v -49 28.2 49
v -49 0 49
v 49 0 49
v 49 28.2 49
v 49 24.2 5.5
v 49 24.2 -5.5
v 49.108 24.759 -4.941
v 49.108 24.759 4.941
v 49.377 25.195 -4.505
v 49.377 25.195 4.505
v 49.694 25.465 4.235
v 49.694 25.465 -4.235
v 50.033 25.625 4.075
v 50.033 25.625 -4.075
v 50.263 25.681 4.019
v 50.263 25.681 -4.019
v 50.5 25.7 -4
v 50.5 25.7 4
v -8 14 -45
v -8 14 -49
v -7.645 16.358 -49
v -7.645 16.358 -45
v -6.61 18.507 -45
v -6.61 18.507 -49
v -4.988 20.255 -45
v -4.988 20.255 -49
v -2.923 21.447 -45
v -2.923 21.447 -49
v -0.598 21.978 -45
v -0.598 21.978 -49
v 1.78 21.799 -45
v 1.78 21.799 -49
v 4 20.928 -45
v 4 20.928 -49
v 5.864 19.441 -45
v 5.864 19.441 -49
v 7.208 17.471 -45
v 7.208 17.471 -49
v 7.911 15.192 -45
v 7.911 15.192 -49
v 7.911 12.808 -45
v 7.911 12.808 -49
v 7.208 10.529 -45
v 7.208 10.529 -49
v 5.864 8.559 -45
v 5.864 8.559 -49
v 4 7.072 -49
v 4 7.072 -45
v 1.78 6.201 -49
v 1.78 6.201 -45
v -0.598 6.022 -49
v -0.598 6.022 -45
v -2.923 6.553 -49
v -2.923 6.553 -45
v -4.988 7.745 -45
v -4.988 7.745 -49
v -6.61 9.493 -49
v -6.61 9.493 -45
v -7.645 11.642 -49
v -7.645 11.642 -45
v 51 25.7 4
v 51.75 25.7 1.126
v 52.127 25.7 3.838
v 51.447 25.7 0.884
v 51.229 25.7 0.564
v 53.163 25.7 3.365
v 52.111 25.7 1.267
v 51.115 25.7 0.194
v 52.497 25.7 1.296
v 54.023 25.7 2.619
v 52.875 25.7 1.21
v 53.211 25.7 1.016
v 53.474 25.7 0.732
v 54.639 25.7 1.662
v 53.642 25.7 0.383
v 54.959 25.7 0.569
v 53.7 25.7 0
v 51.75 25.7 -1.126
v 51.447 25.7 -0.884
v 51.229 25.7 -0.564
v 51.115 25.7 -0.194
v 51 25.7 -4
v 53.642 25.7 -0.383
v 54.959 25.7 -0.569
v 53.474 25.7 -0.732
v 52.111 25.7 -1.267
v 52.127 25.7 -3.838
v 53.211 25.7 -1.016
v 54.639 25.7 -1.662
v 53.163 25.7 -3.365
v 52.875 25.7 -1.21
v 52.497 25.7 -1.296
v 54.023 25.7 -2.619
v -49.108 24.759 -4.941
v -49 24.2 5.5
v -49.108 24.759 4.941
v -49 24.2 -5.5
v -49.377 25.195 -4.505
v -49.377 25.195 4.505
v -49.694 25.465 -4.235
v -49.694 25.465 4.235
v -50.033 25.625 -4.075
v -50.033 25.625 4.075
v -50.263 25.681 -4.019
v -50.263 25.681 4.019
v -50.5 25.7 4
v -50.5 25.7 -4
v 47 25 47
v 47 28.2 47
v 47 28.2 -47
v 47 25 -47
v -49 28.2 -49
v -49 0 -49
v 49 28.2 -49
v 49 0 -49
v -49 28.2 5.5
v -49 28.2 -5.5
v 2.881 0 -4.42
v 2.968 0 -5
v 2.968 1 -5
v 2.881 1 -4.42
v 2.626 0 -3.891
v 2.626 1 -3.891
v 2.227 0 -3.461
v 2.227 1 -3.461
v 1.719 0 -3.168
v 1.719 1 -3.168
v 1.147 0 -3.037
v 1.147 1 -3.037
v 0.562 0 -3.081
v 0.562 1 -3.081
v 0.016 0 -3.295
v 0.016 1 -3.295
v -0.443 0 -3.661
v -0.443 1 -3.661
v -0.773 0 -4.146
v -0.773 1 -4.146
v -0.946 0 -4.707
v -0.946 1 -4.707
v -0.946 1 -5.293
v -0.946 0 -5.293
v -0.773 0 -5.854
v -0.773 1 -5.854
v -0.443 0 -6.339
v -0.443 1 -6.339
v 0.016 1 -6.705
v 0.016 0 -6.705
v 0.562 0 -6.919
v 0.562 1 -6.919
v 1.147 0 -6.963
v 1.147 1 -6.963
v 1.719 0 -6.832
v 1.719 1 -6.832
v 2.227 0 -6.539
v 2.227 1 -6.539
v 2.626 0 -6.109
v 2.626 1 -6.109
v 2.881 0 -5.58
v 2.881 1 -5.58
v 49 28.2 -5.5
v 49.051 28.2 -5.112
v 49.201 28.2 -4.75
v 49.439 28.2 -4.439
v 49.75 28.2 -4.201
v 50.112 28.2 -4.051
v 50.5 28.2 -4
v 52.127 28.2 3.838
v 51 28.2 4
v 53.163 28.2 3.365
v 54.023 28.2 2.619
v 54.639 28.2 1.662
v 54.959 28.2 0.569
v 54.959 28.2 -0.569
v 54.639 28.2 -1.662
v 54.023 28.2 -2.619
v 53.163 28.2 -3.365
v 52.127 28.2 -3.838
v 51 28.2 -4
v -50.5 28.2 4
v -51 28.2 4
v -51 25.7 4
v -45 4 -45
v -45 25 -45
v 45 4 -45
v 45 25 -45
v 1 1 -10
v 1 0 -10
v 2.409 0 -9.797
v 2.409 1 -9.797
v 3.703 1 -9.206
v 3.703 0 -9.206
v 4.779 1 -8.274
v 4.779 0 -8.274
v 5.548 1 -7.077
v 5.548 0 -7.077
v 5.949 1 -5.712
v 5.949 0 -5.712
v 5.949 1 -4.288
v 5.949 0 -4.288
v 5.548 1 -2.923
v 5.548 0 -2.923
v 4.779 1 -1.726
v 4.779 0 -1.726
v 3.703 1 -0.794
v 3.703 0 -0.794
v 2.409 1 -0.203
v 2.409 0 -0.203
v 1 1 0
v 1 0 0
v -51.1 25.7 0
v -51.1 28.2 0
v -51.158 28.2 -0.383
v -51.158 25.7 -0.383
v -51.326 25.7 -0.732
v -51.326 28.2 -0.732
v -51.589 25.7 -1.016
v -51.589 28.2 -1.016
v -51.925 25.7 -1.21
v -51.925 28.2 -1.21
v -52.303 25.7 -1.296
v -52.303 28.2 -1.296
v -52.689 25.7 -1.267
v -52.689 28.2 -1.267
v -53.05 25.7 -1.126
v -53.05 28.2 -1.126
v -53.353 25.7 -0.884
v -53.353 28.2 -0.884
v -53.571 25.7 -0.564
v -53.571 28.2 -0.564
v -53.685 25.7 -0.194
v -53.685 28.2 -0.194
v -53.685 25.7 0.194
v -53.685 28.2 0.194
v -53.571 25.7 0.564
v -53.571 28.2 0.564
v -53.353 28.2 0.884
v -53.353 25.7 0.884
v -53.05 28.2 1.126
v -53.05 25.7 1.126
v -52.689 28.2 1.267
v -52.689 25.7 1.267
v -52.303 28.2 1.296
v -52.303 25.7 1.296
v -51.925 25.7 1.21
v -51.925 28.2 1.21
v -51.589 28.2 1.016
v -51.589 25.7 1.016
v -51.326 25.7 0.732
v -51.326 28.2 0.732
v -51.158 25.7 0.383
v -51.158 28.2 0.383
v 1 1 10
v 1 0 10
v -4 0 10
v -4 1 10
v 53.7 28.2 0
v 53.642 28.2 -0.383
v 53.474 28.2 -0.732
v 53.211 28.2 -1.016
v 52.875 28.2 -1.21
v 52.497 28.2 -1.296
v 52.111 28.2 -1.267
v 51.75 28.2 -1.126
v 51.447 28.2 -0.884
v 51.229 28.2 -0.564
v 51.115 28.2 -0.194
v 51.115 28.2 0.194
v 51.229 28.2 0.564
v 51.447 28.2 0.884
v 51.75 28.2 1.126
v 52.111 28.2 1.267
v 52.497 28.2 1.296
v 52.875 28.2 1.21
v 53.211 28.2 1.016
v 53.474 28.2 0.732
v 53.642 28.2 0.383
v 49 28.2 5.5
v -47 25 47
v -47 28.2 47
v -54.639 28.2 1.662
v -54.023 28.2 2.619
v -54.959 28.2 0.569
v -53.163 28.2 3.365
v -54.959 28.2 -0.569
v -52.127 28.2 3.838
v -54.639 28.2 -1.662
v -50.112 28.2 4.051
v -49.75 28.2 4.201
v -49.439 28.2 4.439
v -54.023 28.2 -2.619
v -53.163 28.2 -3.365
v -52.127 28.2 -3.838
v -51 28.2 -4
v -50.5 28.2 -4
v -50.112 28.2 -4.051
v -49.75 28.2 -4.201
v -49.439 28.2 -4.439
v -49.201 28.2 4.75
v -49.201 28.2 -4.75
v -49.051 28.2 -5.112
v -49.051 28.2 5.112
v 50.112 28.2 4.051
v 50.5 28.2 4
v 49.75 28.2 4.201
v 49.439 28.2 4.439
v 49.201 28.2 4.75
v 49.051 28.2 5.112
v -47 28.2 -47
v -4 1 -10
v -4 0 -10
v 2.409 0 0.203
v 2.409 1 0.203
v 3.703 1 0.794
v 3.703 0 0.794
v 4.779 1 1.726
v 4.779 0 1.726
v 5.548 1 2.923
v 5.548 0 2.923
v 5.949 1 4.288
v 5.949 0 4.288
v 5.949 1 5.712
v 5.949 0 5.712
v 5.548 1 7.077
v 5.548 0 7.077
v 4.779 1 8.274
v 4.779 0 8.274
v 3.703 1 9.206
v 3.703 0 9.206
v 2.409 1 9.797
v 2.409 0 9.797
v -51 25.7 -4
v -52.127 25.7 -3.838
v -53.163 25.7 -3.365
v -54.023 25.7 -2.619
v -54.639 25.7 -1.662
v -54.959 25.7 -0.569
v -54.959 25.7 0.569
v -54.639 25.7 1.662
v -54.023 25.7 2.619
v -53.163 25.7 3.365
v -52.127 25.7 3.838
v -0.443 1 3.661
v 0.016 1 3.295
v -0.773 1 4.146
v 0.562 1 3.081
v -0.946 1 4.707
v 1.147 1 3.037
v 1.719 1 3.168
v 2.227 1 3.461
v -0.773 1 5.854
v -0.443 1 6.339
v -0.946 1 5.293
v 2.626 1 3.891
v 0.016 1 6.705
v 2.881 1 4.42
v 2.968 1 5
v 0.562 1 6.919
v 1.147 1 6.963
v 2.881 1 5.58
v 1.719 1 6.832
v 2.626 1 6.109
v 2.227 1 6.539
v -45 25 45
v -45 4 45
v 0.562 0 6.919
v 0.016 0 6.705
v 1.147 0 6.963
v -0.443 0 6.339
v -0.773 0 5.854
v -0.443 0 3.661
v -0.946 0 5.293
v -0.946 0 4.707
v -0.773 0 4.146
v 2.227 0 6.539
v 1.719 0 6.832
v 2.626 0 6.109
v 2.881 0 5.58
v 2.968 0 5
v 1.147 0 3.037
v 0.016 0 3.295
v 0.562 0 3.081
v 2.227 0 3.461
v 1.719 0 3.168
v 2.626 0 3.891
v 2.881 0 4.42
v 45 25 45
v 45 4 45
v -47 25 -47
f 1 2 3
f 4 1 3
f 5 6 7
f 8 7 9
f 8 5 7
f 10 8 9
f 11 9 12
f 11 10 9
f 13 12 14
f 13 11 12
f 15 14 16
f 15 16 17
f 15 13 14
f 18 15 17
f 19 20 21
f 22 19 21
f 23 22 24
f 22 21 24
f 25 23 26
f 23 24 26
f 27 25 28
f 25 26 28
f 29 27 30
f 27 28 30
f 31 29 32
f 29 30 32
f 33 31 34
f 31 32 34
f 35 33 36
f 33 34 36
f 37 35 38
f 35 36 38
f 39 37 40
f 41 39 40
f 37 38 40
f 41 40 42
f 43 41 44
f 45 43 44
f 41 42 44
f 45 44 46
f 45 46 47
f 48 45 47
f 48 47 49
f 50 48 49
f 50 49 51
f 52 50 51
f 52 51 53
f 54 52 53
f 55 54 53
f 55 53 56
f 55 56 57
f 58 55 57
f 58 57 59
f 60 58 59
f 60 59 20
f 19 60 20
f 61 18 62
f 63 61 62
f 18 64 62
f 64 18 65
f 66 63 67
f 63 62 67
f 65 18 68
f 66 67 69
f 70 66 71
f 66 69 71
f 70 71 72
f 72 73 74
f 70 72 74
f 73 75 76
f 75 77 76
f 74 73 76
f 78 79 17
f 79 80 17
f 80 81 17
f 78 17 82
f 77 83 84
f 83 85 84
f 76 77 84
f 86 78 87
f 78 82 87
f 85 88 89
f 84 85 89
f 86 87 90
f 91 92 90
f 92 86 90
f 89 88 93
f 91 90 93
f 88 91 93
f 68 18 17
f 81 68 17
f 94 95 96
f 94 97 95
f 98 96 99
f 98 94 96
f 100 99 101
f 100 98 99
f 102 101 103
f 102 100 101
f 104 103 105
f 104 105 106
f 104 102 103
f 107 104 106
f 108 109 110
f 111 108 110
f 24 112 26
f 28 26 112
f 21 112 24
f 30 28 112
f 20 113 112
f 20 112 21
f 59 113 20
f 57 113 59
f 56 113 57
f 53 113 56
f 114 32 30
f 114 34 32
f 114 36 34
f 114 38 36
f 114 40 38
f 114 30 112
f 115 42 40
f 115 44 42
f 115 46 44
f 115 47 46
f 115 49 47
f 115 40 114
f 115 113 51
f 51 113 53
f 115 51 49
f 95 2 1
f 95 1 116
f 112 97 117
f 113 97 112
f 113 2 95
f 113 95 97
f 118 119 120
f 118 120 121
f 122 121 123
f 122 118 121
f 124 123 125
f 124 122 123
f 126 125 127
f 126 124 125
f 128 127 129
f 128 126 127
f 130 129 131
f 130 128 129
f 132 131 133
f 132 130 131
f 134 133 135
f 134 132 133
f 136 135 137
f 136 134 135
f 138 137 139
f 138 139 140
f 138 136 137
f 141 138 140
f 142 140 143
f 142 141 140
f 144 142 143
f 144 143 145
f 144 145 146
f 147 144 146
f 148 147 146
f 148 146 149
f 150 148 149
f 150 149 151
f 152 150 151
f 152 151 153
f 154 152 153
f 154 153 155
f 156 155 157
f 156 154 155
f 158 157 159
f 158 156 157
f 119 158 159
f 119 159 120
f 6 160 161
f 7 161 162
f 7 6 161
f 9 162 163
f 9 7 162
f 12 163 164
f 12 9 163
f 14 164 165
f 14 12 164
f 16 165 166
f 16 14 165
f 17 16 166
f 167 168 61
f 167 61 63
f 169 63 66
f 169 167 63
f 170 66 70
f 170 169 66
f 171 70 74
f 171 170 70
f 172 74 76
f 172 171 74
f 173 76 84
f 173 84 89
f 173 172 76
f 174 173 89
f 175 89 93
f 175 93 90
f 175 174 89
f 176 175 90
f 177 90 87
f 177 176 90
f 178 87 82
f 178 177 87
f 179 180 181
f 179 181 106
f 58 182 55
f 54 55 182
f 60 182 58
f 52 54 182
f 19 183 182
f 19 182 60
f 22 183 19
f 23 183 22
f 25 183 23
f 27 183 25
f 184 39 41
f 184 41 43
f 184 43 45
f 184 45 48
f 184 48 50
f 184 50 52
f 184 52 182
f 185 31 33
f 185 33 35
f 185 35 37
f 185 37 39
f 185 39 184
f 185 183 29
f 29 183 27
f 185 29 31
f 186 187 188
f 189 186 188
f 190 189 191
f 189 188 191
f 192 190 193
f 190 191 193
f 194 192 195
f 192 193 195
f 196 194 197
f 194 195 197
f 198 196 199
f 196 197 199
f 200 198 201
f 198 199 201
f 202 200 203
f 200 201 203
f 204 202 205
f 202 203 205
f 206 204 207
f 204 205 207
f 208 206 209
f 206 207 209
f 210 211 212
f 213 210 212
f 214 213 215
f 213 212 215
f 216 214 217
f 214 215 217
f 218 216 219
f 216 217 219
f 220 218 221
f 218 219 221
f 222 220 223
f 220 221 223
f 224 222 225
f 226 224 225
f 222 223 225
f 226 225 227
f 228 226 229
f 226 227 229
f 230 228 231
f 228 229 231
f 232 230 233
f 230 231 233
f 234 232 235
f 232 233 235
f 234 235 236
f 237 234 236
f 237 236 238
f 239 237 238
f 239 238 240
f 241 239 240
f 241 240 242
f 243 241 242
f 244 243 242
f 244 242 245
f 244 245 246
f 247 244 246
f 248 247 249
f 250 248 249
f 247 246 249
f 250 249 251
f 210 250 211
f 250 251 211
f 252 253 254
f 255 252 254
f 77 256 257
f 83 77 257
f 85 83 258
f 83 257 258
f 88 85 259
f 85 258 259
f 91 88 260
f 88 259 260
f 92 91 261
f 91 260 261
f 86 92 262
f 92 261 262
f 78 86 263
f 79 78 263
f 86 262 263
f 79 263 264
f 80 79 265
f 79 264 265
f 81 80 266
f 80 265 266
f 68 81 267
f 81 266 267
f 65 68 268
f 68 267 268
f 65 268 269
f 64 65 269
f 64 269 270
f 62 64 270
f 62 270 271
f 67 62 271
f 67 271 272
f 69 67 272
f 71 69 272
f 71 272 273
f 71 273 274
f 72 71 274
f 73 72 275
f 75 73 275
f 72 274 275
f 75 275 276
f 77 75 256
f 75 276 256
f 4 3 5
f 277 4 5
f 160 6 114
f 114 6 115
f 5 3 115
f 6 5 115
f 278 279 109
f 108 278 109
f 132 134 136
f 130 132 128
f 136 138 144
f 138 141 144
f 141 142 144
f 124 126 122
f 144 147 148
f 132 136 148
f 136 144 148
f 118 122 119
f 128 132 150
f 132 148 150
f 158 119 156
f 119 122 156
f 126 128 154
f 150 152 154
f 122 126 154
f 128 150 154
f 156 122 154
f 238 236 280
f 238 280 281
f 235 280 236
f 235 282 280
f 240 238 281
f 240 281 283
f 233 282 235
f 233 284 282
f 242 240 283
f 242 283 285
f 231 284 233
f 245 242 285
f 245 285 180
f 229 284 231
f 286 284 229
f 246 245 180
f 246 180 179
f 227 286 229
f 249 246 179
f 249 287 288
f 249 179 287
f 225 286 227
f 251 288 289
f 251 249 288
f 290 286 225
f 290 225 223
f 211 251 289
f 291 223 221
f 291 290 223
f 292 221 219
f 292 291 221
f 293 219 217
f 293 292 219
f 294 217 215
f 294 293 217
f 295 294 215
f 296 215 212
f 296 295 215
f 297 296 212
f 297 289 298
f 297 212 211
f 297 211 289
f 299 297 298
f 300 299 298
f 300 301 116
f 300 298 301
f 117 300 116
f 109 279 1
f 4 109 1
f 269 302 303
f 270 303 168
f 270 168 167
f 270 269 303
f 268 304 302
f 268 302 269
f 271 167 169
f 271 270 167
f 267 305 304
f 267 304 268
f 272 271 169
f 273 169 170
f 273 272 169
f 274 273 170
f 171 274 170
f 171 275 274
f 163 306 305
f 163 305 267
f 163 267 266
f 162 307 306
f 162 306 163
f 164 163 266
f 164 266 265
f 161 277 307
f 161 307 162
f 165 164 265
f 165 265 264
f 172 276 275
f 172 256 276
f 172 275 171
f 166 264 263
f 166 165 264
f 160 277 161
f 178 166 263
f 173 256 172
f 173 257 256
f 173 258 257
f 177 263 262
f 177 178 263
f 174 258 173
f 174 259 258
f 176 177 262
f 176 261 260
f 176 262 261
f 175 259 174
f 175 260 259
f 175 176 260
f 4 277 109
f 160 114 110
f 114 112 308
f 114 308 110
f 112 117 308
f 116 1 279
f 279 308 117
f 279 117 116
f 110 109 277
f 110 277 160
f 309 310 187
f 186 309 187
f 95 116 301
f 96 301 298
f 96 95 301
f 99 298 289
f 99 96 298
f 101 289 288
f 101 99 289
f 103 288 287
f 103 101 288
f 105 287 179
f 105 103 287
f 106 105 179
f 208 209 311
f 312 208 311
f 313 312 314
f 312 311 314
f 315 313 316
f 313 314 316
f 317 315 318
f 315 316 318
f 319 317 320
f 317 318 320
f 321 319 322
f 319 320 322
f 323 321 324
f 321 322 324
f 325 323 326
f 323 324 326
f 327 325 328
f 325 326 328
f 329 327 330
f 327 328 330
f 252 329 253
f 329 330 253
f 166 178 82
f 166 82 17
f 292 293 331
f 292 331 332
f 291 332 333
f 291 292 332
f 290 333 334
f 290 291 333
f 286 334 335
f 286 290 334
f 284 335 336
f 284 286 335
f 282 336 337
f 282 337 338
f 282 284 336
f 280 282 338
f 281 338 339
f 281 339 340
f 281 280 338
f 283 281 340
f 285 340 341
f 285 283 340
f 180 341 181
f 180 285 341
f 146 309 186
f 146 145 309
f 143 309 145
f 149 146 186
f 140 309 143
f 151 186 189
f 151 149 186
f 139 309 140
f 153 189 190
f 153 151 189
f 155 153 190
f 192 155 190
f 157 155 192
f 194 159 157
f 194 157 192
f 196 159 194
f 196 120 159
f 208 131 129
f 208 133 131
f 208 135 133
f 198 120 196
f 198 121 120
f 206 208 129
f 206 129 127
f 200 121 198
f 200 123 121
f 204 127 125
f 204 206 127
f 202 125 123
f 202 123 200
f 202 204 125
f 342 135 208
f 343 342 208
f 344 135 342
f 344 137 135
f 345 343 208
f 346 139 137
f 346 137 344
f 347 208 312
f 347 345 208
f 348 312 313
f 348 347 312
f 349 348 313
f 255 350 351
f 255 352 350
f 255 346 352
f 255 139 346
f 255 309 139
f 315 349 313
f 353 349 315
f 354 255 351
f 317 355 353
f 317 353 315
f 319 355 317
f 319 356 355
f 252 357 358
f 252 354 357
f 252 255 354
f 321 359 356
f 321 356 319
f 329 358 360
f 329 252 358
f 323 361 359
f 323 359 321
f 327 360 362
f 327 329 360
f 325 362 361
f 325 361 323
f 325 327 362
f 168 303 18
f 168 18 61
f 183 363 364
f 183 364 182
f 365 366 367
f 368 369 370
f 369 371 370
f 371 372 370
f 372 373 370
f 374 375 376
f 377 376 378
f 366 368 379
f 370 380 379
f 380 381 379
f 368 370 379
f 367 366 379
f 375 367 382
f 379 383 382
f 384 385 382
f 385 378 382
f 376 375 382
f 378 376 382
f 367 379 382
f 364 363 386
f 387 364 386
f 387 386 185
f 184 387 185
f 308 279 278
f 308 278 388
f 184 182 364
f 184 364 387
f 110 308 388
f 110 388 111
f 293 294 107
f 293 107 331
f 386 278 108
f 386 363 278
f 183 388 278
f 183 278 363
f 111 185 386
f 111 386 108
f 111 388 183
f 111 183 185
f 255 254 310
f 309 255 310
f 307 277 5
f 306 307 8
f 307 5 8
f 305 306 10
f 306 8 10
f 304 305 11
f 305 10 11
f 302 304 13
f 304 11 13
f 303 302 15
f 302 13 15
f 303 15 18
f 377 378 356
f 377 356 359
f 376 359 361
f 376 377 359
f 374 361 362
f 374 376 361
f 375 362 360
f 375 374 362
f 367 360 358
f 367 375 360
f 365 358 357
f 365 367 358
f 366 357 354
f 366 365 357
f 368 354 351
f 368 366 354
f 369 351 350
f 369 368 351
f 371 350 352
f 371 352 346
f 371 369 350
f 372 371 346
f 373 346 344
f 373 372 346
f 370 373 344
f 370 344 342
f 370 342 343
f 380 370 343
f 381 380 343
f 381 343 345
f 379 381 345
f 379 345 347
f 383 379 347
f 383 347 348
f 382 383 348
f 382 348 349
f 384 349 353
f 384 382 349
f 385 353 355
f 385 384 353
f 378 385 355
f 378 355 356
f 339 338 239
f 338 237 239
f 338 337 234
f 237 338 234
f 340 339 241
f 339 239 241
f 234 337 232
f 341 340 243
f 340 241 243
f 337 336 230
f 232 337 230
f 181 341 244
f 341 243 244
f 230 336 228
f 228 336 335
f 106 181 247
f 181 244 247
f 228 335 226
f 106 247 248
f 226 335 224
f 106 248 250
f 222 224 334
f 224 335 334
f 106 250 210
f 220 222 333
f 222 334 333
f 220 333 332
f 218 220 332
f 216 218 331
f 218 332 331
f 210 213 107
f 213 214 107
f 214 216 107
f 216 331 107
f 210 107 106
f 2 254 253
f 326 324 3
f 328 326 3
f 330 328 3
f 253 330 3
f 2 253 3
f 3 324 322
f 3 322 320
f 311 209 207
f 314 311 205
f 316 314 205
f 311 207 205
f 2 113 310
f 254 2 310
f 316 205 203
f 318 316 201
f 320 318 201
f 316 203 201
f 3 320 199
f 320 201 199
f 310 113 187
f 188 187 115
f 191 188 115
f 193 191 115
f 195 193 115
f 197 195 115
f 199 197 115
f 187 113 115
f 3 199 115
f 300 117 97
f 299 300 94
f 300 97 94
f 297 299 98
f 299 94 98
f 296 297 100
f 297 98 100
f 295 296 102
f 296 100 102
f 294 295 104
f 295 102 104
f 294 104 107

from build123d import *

# Parameters (mm, degrees)
SKETCH1_W           = 98
SKETCH1_H           = 98
BOSS_EXTRUDE1_DEPTH = 30
SKETCH2_W           = 94
SKETCH2_H           = 94
CUT_EXTRUDE1_DEPTH  = 5
SKETCH3_W           = 90
SKETCH3_H           = 90
CUT_EXTRUDE2_DEPTH  = 21
SKETCH4_W           = 98
SKETCH4_H           = 98
SKETCH4_W_2         = 94
SKETCH4_H_2         = 94
CUT_EXTRUDE3_DEPTH  = 1.8
SKETCH5_R           = 1.3
BOSS_EXTRUDE2_DEPTH = 2.5
FILLET1_R           = 1.5
FILLET2_R           = 1.5
CUT_EXTRUDE4_REACH  = 100
SKETCH6_R           = 8
SKETCH7_R           = 1.968352886
CUT_EXTRUDE5_DEPTH  = 1


with BuildPart() as part:
    # Sketch1 → Boss-Extrude1 (new body)
    with BuildSketch(Plane(origin=(0, 0, 0), x_dir=(1, 0, 0), z_dir=(0, 1, 0))):
        Rectangle(SKETCH1_W, SKETCH1_H)
    extrude(amount=BOSS_EXTRUDE1_DEPTH)

    # Sketch2 → Cut-Extrude1 (cut)
    with BuildSketch(Plane(origin=(0, 30, 0), x_dir=(1, 0, 0), z_dir=(0, 1, 0))):
        Rectangle(SKETCH2_W, SKETCH2_H)
    extrude(amount=-CUT_EXTRUDE1_DEPTH, mode=Mode.SUBTRACT)

    # Sketch3 → Cut-Extrude2 (cut)
    with BuildSketch(Plane(origin=(0, 25, 0), x_dir=(1, 0, 0), z_dir=(0, 1, 0))):
        Rectangle(SKETCH3_W, SKETCH3_H)
    extrude(amount=-CUT_EXTRUDE2_DEPTH, mode=Mode.SUBTRACT)

    # Sketch4 → Cut-Extrude3 (cut)
    with BuildSketch(Plane(origin=(0, 30, 0), x_dir=(1, 0, 0), z_dir=(0, 1, 0))):
        Rectangle(SKETCH4_W, SKETCH4_H)
        Rectangle(SKETCH4_W_2, SKETCH4_H_2, mode=Mode.SUBTRACT)
    extrude(amount=-CUT_EXTRUDE3_DEPTH, mode=Mode.SUBTRACT)

    # Sketch5 → Boss-Extrude2 (add)
    with BuildSketch(Plane(origin=(0, 28.2, 0), x_dir=(1, 0, 0), z_dir=(0, 1, 0))):
        with BuildLine():
            Line((-49, 4), (-51, 4))
            ThreePointArc((-51, 4), (-55, 0), (-51, -4))
            Line((-51, -4), (-49, -4))
            Line((-49, -4), (-49, 4))
        make_face()
        with Locations((-52.4, 0)):
            Circle(SKETCH5_R, mode=Mode.SUBTRACT)
        with BuildLine():
            Line((49, 4), (49, -4))
            Line((49, -4), (51, -4))
            ThreePointArc((51, -4), (55, 0), (51, 4))
            Line((51, 4), (49, 4))
        make_face()
        with Locations((52.4, 0)):
            Circle(SKETCH5_R, mode=Mode.SUBTRACT)
    extrude(amount=-BOSS_EXTRUDE2_DEPTH)

    # Fillet1
    fillet1_edges = [part.edges().sort_by_distance(p)[0] for p in [
        (-49, 25.7, 0),
        (-49, 26.95, -4),
        (-49, 26.95, 4),
    ]]
    fillet(fillet1_edges, radius=FILLET1_R)

    # Fillet2
    fillet2_edges = [part.edges().sort_by_distance(p)[0] for p in [
        (49, 26.95, -4),
        (49, 25.7, 0),
        (49, 26.95, 4),
    ]]
    fillet(fillet2_edges, radius=FILLET2_R)

    # Sketch6 → Cut-Extrude4 (cut, up to next)
    with BuildSketch(Plane(origin=(0, 0, -49), x_dir=(-1, 0, 0), z_dir=(0, 0, -1)), mode=Mode.PRIVATE) as cut_extrude4_sk1:
        with Locations((0, 14)):
            Circle(SKETCH6_R)
    cut_extrude4_tool1 = extrude(cut_extrude4_sk1.sketch, amount=-CUT_EXTRUDE4_REACH, mode=Mode.PRIVATE) & part.part
    add(cut_extrude4_tool1.solids().sort_by_distance((0, 14, -49))[0], mode=Mode.SUBTRACT)

    # Sketch7 → Cut-Extrude5 (cut)
    with BuildSketch(Plane.XZ):
        with BuildLine():
            Line((-4, -10), (-1, -10))
            Line((-1, -10), (1, -10))
            ThreePointArc((1, -10), (6, -5), (1, 0))
            ThreePointArc((1, 0), (6, 5), (1, 10))
            Line((1, 10), (-4, 10))
            Line((-4, 10), (-4, -10))
        make_face()
        with Locations((1, 5)):
            Circle(SKETCH7_R, mode=Mode.SUBTRACT)
        with Locations((1, -5)):
            Circle(SKETCH7_R, mode=Mode.SUBTRACT)
    extrude(amount=-CUT_EXTRUDE5_DEPTH, mode=Mode.SUBTRACT)


solid = part.part
